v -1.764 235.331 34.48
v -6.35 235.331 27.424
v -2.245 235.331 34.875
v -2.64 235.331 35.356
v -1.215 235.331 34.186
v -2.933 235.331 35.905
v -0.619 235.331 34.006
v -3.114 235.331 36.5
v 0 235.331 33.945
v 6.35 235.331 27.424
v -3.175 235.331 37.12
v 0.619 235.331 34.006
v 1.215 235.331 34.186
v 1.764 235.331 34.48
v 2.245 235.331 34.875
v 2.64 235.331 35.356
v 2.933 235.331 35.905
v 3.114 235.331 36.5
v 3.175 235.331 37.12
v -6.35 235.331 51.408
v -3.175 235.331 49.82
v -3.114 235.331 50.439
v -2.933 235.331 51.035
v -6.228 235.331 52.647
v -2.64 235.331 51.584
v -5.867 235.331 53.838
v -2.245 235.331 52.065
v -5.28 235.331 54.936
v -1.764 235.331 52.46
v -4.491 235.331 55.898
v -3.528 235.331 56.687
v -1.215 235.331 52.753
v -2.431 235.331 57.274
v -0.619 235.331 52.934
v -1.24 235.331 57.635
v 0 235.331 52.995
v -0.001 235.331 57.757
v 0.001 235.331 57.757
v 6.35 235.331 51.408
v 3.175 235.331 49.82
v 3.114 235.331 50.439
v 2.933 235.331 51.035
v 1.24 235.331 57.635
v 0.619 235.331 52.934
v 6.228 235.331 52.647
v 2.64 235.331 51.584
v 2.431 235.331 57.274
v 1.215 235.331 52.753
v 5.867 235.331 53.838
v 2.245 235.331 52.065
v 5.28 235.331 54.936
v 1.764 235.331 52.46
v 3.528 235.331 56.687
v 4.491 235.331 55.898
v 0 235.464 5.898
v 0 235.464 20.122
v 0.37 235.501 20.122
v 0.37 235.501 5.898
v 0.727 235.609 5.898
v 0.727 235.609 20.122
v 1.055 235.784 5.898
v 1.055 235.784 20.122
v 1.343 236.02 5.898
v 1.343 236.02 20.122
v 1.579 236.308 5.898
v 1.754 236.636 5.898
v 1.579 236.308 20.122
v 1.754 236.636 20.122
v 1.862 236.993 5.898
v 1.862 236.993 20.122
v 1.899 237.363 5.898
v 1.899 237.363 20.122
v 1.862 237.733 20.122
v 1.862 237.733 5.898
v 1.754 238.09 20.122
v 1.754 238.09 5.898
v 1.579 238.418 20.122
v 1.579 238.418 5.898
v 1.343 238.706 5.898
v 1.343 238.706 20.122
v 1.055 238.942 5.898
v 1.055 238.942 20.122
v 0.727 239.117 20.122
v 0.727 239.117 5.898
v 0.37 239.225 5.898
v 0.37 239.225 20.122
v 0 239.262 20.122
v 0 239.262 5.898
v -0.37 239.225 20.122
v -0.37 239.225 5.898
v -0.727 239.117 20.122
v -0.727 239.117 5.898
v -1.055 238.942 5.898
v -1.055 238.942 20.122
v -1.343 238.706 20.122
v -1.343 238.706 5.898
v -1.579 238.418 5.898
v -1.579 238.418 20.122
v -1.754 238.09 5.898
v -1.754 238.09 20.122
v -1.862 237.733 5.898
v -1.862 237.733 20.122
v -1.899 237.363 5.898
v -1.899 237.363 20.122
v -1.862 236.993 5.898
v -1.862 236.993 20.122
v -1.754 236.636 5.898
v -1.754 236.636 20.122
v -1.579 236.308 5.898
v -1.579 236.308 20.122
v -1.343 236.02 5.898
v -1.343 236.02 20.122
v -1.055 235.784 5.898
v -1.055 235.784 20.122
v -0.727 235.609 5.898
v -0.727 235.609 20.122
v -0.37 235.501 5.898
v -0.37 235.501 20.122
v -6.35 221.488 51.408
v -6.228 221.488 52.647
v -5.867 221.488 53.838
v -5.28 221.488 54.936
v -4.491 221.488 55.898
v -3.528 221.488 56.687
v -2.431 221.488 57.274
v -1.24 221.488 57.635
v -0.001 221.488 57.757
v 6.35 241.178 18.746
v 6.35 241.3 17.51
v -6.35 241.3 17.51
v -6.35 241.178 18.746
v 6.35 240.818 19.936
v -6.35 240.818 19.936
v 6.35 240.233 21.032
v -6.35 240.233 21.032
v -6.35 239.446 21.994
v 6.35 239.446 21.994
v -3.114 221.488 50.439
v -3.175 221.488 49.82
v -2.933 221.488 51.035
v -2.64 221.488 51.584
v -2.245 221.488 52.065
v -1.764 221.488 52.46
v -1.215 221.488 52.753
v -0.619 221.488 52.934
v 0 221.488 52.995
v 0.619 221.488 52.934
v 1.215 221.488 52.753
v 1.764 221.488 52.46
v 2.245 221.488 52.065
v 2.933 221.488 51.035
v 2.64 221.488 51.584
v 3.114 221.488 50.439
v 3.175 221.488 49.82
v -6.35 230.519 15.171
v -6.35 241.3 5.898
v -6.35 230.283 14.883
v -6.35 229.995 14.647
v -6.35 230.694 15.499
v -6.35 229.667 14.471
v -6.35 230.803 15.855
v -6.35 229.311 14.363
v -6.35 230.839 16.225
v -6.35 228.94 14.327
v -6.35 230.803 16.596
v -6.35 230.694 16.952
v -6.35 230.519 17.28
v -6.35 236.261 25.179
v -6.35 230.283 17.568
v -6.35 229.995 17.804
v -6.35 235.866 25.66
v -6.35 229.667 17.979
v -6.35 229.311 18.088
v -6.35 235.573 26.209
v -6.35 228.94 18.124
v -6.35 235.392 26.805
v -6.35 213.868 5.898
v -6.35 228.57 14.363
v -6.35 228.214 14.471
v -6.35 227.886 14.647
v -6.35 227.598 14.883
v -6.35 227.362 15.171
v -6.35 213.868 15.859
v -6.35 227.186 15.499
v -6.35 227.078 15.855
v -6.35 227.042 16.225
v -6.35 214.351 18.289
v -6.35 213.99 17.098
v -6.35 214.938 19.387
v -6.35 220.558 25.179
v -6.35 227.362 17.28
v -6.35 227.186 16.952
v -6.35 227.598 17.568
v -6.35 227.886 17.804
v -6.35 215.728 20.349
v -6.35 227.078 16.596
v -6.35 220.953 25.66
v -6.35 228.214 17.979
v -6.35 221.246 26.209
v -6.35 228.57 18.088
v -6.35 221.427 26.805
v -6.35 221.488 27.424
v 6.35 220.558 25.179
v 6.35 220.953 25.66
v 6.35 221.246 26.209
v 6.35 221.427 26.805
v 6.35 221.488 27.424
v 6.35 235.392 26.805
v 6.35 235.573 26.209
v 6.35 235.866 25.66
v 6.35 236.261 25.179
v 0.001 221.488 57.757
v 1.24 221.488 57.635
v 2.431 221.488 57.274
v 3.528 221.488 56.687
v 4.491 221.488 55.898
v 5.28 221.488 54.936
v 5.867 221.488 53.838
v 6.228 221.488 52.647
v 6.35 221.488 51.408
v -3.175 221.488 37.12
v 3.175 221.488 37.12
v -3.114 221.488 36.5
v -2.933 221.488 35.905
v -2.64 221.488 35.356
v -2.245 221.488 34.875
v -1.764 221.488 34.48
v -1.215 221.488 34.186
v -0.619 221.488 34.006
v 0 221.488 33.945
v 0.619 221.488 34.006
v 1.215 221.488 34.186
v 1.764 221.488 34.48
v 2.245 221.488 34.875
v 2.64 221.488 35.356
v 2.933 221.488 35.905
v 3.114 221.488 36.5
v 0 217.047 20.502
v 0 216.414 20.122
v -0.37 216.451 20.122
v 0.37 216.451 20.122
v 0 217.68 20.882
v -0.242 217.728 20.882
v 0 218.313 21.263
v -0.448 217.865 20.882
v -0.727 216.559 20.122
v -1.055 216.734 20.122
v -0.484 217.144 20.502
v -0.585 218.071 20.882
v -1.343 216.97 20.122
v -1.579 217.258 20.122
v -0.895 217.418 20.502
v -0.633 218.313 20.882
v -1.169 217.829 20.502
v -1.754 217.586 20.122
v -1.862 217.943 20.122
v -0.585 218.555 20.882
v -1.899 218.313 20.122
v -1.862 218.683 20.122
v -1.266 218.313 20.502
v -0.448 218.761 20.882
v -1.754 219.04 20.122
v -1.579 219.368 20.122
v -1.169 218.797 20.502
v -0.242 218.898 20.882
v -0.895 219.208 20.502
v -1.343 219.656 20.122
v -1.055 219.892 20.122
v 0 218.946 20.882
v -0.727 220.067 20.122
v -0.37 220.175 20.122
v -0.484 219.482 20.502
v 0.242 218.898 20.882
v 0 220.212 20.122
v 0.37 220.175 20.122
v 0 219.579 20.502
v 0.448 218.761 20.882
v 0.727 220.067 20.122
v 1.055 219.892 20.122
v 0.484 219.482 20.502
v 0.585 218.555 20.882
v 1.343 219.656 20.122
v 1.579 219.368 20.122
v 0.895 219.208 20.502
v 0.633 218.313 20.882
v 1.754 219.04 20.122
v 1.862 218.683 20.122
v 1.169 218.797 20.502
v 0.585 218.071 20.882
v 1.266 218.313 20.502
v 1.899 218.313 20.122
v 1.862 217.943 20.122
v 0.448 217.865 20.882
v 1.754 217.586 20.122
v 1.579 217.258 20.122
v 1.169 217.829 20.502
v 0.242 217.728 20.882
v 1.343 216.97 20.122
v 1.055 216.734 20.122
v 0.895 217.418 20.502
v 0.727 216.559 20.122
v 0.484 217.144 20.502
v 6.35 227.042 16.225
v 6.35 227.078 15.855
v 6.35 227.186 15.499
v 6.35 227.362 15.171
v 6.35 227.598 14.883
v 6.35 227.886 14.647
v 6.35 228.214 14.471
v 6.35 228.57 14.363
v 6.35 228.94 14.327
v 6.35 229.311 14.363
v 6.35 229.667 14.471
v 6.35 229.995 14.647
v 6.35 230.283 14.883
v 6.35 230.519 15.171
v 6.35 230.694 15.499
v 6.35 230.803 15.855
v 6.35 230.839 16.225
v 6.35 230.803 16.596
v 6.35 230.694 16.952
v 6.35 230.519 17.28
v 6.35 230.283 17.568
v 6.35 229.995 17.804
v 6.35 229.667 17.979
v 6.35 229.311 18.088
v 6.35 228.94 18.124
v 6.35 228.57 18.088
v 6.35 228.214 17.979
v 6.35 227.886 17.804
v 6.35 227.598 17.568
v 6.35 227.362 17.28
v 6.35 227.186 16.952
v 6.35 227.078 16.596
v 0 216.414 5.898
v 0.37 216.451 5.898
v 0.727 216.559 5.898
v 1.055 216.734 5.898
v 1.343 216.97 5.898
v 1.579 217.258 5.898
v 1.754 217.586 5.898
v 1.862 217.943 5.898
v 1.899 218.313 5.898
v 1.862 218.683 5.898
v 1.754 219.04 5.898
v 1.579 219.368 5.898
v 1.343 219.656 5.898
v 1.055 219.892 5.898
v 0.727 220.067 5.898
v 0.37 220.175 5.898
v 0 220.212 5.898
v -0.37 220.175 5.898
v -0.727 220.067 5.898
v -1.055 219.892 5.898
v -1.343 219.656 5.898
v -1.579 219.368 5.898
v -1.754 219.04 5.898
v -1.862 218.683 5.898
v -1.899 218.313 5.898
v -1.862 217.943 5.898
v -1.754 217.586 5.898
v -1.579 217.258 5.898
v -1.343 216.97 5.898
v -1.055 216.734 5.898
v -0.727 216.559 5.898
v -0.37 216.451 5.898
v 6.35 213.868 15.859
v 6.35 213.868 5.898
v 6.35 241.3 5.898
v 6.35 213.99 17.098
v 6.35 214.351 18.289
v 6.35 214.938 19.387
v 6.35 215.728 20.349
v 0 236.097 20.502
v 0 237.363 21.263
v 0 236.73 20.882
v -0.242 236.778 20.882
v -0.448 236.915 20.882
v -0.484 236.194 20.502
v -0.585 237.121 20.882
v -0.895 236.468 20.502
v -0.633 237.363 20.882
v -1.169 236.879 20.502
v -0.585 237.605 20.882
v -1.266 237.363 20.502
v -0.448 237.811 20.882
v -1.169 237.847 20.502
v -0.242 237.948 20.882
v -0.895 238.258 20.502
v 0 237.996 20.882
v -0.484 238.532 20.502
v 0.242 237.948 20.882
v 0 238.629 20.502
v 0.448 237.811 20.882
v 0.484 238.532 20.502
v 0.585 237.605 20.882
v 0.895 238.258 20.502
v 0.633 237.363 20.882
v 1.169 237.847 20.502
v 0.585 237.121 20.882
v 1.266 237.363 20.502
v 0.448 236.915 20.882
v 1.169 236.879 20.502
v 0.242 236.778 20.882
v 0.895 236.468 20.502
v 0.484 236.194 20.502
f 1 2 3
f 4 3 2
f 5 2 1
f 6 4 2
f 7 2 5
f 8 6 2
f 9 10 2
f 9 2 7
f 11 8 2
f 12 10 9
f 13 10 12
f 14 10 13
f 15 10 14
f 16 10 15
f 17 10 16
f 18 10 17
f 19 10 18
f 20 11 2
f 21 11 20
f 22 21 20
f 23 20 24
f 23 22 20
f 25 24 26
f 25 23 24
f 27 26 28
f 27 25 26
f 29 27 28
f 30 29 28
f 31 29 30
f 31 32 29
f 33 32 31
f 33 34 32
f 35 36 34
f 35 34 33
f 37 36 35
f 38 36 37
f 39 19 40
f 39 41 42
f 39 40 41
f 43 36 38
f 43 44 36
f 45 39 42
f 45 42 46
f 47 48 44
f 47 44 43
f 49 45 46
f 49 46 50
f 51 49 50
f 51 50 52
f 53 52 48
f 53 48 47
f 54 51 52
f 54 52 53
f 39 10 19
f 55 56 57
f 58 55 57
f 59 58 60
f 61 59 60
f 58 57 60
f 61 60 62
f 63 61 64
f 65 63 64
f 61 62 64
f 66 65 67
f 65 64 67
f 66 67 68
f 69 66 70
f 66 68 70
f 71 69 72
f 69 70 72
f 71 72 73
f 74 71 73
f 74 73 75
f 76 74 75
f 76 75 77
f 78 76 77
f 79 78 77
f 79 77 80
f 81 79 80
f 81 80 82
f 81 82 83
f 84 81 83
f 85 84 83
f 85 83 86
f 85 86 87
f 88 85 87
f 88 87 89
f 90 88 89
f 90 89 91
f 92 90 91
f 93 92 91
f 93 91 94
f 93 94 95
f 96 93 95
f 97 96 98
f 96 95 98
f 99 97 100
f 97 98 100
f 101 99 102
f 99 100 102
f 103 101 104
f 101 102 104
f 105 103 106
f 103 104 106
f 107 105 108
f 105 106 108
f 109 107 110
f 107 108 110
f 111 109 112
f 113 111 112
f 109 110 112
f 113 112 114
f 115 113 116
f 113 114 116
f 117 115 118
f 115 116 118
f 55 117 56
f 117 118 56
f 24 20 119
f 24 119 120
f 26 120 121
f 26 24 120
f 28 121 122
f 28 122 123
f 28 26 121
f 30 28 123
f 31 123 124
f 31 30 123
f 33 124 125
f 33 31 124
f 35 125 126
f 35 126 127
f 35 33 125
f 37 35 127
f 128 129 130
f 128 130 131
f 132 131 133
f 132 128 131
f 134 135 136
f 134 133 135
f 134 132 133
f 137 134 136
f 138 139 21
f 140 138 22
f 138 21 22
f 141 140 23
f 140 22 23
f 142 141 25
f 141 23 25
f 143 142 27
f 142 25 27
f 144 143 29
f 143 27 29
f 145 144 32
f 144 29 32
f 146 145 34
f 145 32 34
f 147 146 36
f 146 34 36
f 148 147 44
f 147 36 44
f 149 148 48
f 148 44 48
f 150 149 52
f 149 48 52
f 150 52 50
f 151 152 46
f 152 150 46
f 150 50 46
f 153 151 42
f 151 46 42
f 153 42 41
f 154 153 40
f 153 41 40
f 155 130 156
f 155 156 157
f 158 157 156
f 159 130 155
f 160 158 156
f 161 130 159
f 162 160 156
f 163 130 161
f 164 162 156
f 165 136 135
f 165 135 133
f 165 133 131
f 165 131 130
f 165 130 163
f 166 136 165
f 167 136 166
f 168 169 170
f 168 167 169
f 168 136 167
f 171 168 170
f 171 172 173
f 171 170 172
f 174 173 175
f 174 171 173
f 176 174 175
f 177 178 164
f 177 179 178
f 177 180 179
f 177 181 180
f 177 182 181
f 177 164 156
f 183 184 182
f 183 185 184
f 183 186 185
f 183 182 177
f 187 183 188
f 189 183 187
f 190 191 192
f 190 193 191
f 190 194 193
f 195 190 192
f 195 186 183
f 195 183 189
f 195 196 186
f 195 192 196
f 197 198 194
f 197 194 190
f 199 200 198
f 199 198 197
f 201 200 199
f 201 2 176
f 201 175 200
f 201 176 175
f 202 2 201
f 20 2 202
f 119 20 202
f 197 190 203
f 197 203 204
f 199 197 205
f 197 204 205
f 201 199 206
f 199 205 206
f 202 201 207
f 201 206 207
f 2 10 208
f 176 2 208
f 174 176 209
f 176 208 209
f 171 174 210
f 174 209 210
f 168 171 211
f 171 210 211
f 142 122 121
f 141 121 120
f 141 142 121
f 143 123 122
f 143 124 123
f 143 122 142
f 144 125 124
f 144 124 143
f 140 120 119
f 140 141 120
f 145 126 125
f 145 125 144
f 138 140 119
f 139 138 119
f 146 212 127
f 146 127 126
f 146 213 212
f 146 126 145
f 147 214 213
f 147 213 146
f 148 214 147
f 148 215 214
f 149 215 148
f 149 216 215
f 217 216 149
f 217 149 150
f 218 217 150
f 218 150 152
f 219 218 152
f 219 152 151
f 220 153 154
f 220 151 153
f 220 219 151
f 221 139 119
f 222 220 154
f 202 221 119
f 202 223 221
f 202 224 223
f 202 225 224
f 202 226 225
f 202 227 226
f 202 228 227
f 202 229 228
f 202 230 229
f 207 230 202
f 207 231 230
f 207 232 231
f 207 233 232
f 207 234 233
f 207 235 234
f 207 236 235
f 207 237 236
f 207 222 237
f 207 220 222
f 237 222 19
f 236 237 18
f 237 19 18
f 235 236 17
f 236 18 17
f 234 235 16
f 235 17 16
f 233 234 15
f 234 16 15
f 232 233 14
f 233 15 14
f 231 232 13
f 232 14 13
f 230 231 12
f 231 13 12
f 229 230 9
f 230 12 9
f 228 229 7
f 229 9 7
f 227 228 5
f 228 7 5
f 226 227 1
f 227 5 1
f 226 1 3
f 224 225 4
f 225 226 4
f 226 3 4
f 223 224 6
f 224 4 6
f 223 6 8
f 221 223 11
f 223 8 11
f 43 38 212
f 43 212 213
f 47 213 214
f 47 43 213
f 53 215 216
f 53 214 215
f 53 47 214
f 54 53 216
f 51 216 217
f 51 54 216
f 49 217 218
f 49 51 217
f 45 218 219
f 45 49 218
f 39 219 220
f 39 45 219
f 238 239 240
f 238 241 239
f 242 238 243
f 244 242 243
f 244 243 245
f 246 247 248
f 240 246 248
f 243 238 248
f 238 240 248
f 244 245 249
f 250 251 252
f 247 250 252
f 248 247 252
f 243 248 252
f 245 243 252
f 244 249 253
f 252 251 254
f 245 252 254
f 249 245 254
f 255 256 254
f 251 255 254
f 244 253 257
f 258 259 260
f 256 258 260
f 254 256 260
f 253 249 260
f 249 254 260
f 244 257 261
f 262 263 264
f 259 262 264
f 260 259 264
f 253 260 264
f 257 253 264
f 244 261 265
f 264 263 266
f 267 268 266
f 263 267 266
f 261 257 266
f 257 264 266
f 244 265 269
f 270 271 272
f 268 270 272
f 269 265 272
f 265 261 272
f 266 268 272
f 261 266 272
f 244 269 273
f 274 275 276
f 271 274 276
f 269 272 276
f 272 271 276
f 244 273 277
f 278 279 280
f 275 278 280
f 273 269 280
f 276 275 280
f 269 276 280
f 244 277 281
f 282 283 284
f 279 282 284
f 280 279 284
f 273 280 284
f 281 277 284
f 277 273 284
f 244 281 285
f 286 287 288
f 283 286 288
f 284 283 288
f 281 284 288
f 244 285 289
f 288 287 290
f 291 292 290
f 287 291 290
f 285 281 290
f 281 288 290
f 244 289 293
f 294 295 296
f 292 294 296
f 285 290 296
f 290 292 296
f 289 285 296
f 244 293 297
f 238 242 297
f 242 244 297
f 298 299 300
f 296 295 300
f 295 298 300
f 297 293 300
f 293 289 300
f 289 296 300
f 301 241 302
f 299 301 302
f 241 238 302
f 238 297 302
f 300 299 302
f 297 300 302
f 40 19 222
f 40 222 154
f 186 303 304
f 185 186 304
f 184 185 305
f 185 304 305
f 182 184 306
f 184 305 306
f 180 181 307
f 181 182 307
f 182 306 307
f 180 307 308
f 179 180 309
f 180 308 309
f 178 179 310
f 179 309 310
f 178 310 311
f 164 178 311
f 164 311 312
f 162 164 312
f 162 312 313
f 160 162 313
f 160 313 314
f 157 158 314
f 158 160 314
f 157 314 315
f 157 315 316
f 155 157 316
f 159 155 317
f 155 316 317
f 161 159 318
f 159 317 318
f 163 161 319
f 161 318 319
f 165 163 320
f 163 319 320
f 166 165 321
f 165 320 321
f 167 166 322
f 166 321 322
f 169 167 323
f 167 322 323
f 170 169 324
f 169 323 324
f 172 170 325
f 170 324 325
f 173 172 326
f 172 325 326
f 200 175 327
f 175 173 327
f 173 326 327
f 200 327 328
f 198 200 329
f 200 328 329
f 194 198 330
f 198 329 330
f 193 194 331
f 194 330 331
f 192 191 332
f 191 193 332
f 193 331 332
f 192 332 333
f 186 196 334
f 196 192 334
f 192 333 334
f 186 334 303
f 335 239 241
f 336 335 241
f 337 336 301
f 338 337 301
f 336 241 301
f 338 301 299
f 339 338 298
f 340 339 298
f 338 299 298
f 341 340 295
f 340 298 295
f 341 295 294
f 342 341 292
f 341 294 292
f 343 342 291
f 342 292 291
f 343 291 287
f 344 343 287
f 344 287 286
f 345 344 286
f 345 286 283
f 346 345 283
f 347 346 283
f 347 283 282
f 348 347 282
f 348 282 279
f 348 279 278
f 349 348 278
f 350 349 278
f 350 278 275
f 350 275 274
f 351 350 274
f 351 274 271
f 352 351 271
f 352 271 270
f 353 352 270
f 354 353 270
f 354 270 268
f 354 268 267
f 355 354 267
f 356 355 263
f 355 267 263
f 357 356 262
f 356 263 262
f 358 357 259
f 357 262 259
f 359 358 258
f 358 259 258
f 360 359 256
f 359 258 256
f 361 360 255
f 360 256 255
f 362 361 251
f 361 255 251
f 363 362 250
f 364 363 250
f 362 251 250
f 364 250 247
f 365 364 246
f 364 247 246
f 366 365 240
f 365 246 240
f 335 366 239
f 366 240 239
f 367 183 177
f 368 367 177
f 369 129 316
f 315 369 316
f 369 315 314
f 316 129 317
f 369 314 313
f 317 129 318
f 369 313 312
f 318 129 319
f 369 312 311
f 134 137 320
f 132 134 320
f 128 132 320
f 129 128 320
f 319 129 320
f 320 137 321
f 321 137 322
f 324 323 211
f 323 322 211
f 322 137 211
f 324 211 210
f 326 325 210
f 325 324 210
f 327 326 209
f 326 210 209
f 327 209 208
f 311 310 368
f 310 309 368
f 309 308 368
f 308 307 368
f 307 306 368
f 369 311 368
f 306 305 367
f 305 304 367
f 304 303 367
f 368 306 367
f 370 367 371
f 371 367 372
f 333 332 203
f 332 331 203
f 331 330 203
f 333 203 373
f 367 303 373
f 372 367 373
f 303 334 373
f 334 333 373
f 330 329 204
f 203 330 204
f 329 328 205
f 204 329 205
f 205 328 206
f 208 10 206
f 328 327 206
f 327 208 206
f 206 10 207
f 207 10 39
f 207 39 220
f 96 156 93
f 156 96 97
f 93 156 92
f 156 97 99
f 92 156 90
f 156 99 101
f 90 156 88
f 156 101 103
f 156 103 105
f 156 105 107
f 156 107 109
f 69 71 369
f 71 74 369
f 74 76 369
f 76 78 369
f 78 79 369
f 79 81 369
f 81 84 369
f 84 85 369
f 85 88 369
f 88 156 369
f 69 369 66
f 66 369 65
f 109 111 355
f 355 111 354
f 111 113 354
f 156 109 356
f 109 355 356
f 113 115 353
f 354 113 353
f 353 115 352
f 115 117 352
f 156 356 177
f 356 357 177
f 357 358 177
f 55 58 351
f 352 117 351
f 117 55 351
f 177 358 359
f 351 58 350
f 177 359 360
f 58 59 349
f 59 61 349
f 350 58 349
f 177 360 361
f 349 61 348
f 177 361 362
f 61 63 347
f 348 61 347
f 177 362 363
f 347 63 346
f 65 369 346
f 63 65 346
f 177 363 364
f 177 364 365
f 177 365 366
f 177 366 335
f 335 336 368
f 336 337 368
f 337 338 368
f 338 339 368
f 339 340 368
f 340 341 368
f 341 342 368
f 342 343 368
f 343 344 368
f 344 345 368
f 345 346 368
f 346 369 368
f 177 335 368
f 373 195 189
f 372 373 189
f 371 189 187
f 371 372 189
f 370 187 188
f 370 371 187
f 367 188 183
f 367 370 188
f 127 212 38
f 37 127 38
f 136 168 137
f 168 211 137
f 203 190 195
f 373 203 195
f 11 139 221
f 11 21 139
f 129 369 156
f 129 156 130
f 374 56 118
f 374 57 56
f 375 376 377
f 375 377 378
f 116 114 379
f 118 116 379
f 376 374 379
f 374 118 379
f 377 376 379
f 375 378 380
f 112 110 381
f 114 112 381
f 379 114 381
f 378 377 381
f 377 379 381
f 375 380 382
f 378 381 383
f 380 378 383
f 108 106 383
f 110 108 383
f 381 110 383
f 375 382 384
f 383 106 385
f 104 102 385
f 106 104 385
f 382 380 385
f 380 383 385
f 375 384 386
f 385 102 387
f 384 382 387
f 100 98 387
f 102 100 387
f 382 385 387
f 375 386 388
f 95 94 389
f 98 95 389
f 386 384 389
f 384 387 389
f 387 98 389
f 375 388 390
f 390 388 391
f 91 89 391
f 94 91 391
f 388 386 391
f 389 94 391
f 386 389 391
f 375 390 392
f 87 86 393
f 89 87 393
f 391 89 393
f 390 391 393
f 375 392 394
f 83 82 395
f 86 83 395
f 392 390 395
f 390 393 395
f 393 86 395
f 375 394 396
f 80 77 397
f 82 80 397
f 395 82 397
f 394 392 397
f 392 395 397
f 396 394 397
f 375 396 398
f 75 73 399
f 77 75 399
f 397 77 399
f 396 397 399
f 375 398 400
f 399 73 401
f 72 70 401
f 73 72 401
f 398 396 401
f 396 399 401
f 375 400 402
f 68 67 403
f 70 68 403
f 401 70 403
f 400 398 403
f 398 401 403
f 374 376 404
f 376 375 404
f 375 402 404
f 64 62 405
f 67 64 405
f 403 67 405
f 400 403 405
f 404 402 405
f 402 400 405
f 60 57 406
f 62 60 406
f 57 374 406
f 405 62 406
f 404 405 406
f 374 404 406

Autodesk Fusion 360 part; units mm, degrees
sketch "Right" plane through (0, 0, 0) normal (1, 0, 0) x (0, 1, 0) in component "Tower"
  line L0 (0, 0) -> (0, 11.6117)
  line L1 (27.432, 9.9611) -> (27.432, 0)
  arc A0 (27.432, 9.9611) -> (25.5721, 14.4512) centre (21.082, 9.9611) ccw
  arc A1 (1.8541, 16.096) -> (0, 11.6117) centre (6.35, 11.6117) ccw
  arc A2 (5.0391, 19.281) -> (5.969, 21.526) centre (2.794, 21.526) ccw
  line L2 (5.0391, 19.281) -> (1.8541, 16.096)
  line L3 (20.7419, 19.2814) -> (25.5721, 14.4512)
  arc A3 (19.812, 21.5265) -> (20.7419, 19.2814) centre (22.987, 21.5265) ccw
  line L4 (19.812, 51.8592) -> (19.812, 21.5265)
  line L5 (19.812, 51.8592) -> (5.969, 51.8592)
  line L6 (5.969, 21.526) -> (5.969, 51.8592)
  line L7 (0, 0) -> (27.432, 0)
  circle A4 centre (12.3596, 10.3275) radius 1.8986
  line L8 (3.937, 0) -> (3.937, 12.7) construction
  line L9 (22.987, 0) -> (22.987, 12.7) construction
  circle A5 centre (12.3596, 10.3275) radius 12.7 construction
  dimension "d1" = 27.432
  dimension "d4" = 10.3275
  dimension "d5" = 6.35
  dimension "d6" = 6.8309
  dimension "d7" = 3.175
  dimension "d8" = 3.175
  dimension "d9" = 6.35
  dimension "d11" = 30.3327
  dimension "d13" = 13.843
  dimension "d14" = 9.9611
  dimension "d16" = 45
  dimension "d17" = 45
  dimension "d19" = 3.937
  dimension "d20" = 19.05
  dimension "d21" = 4.445
  dimension "d22" = 3.7973
  dimension "d23" = 12.3596
  dimension "d24" = 25.5721
  dimension "d25" = 14.4512
  dimension "d26" = 21.5265
  dimension "d28" = 12.7
  dimension "d29" = 12.7
  dimension "d46" = 16.096
  dimension "d47" = 1.8541
  dimension "d48" = 25.4
extrude "Extrude1" add sketch "Right" along normal mid plane 12.7 in component "Tower"
sketch "Front" plane through (0, 0, 0) normal (0, 1, 0) x (1, 0, 0) in component "Tower"
  line L0 (3.175, -43.9217) -> (3.175, -31.2217)
  arc A0 (3.175, -31.2217) -> (-3.175, -31.2217) centre (0, -31.2217) ccw
  line L1 (-3.175, -31.2217) -> (-3.175, -43.9217)
  arc A1 (-3.175, -43.9217) -> (3.175, -43.9217) centre (0, -43.9217) ccw
  line L2 (0, -43.9217) -> (0, -31.2217) construction
  dimension "d32" = 6.35
  dimension "d33" = 31.2217
  dimension "d34" = 12.7
  dimension "d35" = 3.175
extrude "Extrude2" cut sketch "Front" along normal up to surface (19.812 mm away) in component "Tower"
sketch "Bottom" plane through (0, 0, 0) normal (0, 0, 1) x (1, 0, 0) in component "Tower"
  circle A0 centre (0, 3.937) radius 1.8986
  circle A1 centre (0, 22.987) radius 1.8986
  dimension "d38" = 19.05
  dimension "d39" = 3.7973
  dimension "d40" = 3.7973
  dimension "d41" = 3.937
hole "Hole1" at (0, 22.987, 0) at (0, 3.937, 0) direction (0, 0, 1) diameter 3.7973 depth 14.224 tip angle 118 in component "Tower"
fillet "Fillet1" radius 6.35 2 edges at (-6.35, 12.8905, 51.8592) (6.35, 12.8905, 51.8592) in component "Tower"
component "Tower" placed x (-1, 0, 0) y (0, -1, 0) z (0, 0, 1) at (0, 241.3, 5.8979)
equation "d39 = d40"
